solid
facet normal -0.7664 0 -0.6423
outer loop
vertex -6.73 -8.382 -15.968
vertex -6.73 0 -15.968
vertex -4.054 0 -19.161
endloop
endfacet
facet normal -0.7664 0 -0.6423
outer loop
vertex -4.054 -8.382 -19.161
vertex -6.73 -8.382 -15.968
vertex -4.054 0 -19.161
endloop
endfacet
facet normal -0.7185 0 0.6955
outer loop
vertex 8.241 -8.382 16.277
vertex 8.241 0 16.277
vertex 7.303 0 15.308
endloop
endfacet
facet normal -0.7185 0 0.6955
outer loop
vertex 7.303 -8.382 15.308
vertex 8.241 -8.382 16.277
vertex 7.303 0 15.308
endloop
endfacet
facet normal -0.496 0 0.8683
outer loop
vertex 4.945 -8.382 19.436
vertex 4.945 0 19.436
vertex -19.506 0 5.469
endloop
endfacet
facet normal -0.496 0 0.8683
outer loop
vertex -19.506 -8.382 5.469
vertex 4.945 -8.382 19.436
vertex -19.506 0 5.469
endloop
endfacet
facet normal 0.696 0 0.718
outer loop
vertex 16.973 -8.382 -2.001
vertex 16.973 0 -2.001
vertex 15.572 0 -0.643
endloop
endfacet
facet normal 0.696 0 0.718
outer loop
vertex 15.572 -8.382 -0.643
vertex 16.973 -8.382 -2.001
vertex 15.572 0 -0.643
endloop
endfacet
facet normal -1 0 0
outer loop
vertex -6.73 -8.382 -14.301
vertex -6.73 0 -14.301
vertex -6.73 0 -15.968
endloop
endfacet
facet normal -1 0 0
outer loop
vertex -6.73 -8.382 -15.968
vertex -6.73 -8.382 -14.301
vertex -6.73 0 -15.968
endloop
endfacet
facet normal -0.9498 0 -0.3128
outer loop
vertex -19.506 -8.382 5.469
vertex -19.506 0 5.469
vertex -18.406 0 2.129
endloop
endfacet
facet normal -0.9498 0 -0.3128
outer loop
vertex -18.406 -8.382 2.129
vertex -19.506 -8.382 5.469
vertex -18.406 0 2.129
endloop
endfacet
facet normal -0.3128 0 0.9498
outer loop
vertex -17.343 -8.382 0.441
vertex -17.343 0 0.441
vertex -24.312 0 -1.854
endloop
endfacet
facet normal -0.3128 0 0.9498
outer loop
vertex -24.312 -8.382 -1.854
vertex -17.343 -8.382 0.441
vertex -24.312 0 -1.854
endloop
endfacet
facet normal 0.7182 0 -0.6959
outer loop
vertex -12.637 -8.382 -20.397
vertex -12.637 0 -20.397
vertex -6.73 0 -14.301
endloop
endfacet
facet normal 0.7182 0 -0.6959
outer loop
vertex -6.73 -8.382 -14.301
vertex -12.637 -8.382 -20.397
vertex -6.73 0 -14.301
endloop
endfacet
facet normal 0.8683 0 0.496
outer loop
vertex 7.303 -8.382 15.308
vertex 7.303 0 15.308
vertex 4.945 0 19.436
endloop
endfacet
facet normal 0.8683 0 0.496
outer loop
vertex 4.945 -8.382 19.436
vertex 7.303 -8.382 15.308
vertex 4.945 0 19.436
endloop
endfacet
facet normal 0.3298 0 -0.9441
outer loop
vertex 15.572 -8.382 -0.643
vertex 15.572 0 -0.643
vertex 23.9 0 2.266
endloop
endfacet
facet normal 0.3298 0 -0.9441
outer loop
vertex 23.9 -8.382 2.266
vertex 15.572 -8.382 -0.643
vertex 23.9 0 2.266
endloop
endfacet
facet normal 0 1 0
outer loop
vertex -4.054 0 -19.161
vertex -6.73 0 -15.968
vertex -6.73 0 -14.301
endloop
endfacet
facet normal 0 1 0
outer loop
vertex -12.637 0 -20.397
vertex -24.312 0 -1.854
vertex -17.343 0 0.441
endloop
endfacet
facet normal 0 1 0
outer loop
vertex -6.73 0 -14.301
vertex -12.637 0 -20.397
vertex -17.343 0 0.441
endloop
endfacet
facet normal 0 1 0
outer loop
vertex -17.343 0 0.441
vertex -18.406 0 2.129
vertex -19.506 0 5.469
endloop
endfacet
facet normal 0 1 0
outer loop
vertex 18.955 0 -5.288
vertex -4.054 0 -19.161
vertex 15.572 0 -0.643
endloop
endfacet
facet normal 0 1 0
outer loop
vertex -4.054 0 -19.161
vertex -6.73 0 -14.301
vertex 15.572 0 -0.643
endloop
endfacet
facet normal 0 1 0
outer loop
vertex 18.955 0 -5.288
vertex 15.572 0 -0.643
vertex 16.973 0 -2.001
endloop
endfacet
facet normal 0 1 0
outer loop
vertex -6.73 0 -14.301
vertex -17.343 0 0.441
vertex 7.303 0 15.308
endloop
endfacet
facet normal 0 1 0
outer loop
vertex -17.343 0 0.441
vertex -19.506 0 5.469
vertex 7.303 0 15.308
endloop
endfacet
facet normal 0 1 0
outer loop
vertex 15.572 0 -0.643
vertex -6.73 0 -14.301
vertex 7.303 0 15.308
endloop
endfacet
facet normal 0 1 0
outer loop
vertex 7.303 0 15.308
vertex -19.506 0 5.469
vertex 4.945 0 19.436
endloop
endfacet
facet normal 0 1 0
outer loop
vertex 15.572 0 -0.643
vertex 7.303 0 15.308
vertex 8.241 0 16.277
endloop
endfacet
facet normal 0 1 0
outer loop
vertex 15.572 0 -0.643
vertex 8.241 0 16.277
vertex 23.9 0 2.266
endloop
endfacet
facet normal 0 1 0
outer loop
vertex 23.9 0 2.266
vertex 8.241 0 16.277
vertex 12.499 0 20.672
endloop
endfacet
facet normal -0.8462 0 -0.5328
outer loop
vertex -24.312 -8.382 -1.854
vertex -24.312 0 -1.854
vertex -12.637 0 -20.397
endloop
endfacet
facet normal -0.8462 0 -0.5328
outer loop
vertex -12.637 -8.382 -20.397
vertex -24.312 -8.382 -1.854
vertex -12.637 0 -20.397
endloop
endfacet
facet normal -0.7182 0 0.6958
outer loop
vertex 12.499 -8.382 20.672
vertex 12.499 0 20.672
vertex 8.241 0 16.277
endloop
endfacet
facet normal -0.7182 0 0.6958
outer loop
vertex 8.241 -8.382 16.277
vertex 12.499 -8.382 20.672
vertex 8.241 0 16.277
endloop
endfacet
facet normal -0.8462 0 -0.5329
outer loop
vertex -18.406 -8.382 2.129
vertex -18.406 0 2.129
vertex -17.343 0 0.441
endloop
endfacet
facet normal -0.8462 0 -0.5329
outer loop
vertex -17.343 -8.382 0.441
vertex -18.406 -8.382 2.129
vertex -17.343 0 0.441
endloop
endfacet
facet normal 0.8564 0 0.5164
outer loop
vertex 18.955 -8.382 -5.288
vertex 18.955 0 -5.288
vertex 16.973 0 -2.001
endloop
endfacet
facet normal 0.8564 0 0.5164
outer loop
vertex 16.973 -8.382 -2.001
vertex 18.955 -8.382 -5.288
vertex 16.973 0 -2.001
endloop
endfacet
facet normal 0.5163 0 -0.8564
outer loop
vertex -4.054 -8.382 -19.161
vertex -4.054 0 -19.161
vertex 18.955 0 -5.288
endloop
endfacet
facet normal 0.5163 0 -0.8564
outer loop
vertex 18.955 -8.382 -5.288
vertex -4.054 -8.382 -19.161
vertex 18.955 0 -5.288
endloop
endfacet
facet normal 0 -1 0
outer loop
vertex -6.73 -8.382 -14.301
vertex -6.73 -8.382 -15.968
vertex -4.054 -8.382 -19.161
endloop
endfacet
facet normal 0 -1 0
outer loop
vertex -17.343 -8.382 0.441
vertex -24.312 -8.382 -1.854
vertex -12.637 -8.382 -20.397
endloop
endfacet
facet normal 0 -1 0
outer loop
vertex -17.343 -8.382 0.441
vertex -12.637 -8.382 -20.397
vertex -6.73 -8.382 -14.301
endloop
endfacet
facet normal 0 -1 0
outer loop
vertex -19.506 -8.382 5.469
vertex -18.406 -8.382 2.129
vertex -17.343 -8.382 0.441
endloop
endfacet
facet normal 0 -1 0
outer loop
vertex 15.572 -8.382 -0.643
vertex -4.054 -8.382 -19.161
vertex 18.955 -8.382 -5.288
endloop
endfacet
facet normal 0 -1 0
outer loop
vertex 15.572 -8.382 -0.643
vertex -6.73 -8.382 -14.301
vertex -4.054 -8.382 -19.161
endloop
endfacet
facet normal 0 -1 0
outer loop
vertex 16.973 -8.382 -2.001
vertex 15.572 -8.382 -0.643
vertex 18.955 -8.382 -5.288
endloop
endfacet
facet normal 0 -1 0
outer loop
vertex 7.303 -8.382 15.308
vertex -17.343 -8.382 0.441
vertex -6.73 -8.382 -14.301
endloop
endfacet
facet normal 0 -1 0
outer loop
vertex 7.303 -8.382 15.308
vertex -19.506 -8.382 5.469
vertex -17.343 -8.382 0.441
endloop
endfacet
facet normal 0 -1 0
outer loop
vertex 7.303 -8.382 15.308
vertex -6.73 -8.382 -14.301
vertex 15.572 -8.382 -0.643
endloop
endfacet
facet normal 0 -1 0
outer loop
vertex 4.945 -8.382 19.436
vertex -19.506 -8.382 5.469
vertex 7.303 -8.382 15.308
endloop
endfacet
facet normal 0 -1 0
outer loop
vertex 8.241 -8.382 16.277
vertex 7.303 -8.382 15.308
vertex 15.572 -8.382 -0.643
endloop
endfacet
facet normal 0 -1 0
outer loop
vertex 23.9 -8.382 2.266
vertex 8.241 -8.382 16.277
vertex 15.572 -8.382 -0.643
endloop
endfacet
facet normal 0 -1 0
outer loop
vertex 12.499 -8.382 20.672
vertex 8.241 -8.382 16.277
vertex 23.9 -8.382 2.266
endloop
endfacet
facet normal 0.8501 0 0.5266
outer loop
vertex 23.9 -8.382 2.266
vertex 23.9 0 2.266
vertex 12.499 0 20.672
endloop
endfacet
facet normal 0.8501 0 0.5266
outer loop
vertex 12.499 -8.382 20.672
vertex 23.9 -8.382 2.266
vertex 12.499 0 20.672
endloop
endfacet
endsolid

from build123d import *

# Parameters (mm, degrees)
F1_DEPTH = 8.382


with BuildPart() as f1:
    # F0 (on Front) → F1 (new body)
    with BuildSketch(Plane.XZ):
        Polygon((-12.636772, 1.991665), (-17.343119, 0.441339), (-24.312051, -1.854309), (-12.636772, -20.397399), (-6.730455, -14.300559), (-4.054186, -11.53796), align=None)
        Polygon((4.395189, 12.306461), (7.302871, 15.307937), (4.944825, 19.435907), (-19.505887, 5.468773), (-18.405734, 2.129021), (-17.343119, 0.441339), (-12.636772, 1.991665), (-4.054186, -11.53796), (-6.730455, -14.300559), (-6.730455, -15.967679), (-4.054186, -19.161193), (18.955158, -5.288215), (16.973184, -2.000967), (15.571872, -0.643444), (12.499417, -1.716953), align=None)
        Polygon((12.499417, 20.672111), (8.241373, 16.276713), (7.302871, 15.307937), (4.395189, 12.306461), (12.499417, -1.716953), (15.571872, -0.643444), (23.899982, 2.266378), align=None)
    extrude(amount=F1_DEPTH)


solid = f1.part
